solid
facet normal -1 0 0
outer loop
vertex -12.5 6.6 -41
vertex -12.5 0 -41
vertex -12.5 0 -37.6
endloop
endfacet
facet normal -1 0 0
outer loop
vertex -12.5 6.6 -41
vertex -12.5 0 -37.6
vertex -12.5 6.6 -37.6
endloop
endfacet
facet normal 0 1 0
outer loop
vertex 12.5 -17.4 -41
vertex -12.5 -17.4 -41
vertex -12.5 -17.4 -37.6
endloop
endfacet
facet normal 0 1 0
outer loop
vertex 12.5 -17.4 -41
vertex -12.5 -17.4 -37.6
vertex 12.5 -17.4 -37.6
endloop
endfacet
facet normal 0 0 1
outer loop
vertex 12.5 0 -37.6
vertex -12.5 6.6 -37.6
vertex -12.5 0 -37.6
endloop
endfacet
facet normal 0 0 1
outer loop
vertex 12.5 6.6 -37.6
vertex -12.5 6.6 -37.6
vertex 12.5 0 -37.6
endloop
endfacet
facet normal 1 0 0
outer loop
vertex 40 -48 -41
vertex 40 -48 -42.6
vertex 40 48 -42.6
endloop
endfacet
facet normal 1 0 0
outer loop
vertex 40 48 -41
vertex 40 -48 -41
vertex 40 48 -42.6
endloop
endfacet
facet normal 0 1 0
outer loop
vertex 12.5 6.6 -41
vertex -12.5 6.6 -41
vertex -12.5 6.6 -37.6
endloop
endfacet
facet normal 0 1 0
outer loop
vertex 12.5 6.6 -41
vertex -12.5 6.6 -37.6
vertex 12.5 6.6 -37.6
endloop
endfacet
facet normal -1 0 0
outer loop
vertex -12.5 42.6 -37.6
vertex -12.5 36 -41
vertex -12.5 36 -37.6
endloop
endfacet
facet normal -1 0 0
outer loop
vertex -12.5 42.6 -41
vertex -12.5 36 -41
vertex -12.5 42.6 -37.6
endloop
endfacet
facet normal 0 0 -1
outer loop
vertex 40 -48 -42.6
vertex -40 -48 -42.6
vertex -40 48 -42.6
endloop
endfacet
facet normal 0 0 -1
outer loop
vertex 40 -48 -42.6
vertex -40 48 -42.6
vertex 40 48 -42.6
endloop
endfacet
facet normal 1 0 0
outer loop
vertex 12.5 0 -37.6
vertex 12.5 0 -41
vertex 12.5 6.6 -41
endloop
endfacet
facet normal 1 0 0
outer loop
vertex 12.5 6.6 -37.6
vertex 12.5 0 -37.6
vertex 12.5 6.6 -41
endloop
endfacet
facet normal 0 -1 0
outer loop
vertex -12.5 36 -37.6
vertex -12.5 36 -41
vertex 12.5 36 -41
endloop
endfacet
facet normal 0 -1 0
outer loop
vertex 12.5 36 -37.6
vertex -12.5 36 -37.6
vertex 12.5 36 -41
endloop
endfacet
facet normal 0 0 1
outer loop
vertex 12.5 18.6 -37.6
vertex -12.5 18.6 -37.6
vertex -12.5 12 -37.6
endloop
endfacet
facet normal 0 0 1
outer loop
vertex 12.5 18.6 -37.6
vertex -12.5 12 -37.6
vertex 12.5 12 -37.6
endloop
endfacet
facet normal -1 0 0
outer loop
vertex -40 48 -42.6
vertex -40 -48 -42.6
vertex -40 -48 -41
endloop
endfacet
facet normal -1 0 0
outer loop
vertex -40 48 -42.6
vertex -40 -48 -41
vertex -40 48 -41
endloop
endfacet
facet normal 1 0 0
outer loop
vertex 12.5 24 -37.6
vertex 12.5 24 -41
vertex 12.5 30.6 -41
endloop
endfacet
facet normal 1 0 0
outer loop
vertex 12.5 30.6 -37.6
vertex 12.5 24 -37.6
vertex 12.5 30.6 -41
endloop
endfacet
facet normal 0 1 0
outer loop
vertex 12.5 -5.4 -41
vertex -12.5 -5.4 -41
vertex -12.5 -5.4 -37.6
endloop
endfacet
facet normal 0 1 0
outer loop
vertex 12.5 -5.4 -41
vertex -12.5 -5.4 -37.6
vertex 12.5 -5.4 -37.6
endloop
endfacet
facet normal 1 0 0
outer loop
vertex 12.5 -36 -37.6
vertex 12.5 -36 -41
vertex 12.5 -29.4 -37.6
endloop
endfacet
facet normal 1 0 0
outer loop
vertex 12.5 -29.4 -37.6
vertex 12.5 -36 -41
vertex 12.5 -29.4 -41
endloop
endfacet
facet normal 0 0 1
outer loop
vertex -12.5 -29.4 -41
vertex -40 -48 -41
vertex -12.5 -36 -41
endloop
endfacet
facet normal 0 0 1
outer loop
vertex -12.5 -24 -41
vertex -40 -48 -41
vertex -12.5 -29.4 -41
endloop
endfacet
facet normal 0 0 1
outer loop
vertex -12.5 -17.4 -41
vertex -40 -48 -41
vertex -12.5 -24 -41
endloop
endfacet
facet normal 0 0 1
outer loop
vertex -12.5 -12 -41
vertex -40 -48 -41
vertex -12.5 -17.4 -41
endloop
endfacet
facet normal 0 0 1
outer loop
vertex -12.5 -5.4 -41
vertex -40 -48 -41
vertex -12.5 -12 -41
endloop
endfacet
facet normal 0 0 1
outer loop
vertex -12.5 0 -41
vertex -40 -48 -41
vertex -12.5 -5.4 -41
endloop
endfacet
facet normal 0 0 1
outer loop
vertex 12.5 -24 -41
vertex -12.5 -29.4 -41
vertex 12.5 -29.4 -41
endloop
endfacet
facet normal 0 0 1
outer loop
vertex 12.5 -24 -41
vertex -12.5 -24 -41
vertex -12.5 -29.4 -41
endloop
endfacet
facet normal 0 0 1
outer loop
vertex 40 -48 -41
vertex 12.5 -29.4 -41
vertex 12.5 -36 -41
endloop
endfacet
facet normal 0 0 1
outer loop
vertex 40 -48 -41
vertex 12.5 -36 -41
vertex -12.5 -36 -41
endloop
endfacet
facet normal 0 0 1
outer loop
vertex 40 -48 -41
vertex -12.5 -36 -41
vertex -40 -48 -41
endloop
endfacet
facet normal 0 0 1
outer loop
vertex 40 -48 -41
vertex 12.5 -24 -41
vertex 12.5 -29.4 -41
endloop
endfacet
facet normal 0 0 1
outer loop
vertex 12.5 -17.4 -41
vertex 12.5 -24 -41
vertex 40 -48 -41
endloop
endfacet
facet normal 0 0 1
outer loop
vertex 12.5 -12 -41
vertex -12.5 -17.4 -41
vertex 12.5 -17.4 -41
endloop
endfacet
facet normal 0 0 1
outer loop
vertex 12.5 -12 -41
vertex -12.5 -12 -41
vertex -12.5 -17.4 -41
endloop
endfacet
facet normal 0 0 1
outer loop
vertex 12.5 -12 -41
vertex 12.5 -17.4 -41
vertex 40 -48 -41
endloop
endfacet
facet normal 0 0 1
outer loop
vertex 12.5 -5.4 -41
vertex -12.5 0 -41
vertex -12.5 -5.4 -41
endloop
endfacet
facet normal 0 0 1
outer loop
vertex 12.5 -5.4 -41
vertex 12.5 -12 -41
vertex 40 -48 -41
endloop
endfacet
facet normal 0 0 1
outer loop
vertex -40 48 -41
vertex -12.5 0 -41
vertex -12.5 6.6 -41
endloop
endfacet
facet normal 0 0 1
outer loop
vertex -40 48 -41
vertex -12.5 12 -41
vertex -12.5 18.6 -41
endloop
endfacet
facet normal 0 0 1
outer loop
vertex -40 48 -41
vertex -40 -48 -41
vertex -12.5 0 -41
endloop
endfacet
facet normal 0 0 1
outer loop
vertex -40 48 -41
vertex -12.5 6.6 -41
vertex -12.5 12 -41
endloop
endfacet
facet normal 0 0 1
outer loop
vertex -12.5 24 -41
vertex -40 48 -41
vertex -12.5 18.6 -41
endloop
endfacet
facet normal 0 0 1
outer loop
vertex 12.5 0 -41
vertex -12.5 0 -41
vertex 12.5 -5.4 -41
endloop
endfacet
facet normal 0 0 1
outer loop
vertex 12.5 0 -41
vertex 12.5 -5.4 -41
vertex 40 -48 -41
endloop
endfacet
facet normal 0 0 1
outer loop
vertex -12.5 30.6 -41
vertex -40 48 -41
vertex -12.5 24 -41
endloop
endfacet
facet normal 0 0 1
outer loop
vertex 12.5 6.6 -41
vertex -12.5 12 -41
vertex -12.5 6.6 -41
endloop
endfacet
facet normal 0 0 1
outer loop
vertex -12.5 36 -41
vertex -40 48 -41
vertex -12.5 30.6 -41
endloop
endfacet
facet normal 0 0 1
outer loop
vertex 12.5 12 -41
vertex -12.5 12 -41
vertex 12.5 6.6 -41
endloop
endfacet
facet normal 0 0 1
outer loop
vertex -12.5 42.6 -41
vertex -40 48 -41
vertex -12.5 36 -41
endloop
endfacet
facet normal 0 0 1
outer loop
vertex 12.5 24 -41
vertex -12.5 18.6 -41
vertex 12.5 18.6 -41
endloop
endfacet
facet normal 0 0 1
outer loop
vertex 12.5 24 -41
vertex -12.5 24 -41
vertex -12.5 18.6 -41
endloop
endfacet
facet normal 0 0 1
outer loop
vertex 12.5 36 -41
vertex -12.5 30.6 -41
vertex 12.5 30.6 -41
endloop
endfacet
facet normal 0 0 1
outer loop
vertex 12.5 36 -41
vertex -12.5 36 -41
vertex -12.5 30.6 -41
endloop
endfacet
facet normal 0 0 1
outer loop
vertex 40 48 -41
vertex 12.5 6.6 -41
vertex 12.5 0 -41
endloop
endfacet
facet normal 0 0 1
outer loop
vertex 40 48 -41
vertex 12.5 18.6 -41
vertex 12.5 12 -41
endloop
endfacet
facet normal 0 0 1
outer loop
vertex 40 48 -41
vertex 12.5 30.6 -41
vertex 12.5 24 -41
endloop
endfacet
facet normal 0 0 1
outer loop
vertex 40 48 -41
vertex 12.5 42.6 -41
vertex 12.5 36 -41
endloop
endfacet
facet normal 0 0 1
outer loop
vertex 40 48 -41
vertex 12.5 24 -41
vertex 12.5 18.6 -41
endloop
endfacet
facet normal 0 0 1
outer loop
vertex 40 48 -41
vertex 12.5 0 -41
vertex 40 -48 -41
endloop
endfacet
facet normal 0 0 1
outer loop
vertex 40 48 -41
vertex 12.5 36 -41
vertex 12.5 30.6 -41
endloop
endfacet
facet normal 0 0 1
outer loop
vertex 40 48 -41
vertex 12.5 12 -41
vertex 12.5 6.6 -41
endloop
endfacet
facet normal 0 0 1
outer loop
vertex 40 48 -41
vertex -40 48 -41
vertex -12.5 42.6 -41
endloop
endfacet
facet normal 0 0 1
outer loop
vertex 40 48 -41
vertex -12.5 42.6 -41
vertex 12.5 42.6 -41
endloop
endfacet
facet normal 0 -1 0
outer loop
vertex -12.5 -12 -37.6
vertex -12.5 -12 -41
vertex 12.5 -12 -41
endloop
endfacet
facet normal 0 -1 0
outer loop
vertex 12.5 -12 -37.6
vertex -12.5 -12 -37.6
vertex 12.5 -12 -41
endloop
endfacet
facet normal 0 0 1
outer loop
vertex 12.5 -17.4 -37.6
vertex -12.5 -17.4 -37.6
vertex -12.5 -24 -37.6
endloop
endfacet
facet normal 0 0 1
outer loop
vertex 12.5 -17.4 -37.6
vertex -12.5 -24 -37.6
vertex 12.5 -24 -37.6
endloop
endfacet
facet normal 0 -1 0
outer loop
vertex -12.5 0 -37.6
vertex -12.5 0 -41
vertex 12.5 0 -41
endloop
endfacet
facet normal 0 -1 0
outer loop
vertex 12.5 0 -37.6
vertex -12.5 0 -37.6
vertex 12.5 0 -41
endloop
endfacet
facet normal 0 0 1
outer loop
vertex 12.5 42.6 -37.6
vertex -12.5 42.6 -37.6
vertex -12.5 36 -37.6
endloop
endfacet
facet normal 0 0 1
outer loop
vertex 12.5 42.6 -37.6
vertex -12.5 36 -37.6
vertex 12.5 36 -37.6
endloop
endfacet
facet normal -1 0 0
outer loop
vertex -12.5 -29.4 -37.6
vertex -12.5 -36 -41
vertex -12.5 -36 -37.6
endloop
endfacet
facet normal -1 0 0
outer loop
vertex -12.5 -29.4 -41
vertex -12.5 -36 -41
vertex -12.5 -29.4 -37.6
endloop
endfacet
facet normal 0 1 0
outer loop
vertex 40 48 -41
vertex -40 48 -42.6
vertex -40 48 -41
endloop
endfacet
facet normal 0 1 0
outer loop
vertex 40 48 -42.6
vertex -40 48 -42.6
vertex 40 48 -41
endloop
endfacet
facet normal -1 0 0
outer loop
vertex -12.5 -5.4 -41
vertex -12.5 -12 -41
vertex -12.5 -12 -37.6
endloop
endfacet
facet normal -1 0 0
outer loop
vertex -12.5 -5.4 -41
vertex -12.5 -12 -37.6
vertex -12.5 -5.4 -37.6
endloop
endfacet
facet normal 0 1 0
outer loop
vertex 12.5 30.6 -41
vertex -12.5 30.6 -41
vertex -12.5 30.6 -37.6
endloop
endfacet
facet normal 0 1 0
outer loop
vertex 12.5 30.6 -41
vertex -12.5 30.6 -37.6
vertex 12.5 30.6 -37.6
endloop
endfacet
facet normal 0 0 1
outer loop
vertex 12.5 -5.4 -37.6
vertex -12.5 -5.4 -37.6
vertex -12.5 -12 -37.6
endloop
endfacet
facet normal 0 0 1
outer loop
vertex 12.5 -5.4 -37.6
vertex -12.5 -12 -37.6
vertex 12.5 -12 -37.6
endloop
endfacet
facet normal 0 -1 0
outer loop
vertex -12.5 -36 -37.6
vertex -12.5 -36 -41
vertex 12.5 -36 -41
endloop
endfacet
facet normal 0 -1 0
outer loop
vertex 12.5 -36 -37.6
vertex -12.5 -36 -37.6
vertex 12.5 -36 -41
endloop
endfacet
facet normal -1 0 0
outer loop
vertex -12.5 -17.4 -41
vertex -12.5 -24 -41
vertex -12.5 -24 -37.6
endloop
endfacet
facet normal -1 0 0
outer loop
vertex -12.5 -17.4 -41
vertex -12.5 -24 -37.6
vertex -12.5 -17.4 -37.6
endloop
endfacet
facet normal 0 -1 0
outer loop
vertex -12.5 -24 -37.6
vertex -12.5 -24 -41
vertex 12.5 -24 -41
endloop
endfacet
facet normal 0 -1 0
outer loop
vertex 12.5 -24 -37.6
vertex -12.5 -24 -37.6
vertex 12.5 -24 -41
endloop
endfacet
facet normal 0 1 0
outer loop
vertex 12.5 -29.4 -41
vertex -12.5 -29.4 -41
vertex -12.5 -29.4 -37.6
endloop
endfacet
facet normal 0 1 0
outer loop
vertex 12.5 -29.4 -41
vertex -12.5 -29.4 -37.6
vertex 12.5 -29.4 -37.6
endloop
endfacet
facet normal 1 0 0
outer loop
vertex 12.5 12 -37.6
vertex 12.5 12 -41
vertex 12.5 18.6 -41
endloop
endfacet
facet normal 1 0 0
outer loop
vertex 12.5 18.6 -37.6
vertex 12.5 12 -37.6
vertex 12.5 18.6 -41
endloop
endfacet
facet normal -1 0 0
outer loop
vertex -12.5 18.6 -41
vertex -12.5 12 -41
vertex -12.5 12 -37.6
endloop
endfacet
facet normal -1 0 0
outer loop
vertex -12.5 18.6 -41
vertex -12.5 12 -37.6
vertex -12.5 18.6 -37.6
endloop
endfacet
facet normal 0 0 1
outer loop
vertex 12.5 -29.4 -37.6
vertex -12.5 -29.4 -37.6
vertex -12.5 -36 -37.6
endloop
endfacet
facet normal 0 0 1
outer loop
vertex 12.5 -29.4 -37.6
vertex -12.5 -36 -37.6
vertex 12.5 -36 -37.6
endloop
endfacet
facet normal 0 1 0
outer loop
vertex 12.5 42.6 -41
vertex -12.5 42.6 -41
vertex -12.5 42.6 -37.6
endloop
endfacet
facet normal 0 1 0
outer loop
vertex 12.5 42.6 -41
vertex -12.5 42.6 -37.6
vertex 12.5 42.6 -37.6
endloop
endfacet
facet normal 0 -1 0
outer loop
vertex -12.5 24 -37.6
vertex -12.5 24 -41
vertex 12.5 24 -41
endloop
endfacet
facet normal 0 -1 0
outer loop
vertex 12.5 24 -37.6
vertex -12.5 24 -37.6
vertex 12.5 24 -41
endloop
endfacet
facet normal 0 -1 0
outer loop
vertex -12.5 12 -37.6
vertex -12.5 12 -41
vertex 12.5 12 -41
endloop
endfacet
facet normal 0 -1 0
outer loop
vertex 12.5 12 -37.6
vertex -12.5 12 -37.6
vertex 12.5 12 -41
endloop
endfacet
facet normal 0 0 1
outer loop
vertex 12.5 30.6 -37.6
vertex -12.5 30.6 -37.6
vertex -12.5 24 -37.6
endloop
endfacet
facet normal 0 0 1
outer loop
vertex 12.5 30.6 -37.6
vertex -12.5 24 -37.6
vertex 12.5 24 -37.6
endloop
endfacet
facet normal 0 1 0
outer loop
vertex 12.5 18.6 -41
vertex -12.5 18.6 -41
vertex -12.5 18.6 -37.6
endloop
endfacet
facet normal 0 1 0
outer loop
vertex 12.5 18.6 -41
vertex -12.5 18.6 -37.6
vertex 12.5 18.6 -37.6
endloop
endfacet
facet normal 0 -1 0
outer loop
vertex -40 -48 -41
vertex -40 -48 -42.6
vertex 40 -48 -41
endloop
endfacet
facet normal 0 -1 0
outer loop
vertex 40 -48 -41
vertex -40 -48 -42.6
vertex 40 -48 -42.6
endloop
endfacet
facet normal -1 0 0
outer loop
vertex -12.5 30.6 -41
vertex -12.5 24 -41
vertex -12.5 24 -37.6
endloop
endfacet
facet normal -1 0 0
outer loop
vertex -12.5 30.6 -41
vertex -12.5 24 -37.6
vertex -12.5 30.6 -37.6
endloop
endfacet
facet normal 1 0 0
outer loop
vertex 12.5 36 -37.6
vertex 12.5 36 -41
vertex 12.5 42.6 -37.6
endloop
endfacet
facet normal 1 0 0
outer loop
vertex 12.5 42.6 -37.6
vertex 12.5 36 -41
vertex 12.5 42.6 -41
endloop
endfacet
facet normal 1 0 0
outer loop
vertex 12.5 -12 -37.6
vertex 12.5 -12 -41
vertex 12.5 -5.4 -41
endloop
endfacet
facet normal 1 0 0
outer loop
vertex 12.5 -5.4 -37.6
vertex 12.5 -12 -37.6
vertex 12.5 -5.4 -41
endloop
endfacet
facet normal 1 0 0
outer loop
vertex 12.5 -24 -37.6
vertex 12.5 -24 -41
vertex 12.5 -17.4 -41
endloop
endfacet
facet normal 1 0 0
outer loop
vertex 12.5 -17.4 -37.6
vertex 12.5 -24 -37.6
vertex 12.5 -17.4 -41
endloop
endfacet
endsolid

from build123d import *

# Parameters (mm, degrees)
SKETCH1_W           = 80
SKETCH1_H           = 96
BOSS_EXTRUDE1_DEPTH = 1.6
SKETCH3_W           = 25
SKETCH3_H           = 6.6
BOSS_EXTRUDE2_DEPTH = 5


with BuildPart() as part:
    # Sketch1 → Boss-Extrude1 (new body)
    with BuildSketch(Plane.XY.offset(-42.6)):
        Rectangle(SKETCH1_W, SKETCH1_H)
    extrude(amount=BOSS_EXTRUDE1_DEPTH)

    # Sketch3 → Boss-Extrude2 (add)
    with BuildSketch(Plane.XY.offset(-42.6)):
        with Locations((0, 39.3)):
            Rectangle(SKETCH3_W, SKETCH3_H)
        with Locations((0, 27.3)):
            Rectangle(SKETCH3_W, SKETCH3_H)
        with Locations((0, 15.3)):
            Rectangle(SKETCH3_W, SKETCH3_H)
        with Locations((0, 3.3)):
            Rectangle(SKETCH3_W, SKETCH3_H)
        with Locations((0, -8.7)):
            Rectangle(SKETCH3_W, SKETCH3_H)
        with Locations((0, -20.7)):
            Rectangle(SKETCH3_W, SKETCH3_H)
        with Locations((0, -32.7)):
            Rectangle(SKETCH3_W, SKETCH3_H)
    extrude(amount=BOSS_EXTRUDE2_DEPTH)


solid = part.part
